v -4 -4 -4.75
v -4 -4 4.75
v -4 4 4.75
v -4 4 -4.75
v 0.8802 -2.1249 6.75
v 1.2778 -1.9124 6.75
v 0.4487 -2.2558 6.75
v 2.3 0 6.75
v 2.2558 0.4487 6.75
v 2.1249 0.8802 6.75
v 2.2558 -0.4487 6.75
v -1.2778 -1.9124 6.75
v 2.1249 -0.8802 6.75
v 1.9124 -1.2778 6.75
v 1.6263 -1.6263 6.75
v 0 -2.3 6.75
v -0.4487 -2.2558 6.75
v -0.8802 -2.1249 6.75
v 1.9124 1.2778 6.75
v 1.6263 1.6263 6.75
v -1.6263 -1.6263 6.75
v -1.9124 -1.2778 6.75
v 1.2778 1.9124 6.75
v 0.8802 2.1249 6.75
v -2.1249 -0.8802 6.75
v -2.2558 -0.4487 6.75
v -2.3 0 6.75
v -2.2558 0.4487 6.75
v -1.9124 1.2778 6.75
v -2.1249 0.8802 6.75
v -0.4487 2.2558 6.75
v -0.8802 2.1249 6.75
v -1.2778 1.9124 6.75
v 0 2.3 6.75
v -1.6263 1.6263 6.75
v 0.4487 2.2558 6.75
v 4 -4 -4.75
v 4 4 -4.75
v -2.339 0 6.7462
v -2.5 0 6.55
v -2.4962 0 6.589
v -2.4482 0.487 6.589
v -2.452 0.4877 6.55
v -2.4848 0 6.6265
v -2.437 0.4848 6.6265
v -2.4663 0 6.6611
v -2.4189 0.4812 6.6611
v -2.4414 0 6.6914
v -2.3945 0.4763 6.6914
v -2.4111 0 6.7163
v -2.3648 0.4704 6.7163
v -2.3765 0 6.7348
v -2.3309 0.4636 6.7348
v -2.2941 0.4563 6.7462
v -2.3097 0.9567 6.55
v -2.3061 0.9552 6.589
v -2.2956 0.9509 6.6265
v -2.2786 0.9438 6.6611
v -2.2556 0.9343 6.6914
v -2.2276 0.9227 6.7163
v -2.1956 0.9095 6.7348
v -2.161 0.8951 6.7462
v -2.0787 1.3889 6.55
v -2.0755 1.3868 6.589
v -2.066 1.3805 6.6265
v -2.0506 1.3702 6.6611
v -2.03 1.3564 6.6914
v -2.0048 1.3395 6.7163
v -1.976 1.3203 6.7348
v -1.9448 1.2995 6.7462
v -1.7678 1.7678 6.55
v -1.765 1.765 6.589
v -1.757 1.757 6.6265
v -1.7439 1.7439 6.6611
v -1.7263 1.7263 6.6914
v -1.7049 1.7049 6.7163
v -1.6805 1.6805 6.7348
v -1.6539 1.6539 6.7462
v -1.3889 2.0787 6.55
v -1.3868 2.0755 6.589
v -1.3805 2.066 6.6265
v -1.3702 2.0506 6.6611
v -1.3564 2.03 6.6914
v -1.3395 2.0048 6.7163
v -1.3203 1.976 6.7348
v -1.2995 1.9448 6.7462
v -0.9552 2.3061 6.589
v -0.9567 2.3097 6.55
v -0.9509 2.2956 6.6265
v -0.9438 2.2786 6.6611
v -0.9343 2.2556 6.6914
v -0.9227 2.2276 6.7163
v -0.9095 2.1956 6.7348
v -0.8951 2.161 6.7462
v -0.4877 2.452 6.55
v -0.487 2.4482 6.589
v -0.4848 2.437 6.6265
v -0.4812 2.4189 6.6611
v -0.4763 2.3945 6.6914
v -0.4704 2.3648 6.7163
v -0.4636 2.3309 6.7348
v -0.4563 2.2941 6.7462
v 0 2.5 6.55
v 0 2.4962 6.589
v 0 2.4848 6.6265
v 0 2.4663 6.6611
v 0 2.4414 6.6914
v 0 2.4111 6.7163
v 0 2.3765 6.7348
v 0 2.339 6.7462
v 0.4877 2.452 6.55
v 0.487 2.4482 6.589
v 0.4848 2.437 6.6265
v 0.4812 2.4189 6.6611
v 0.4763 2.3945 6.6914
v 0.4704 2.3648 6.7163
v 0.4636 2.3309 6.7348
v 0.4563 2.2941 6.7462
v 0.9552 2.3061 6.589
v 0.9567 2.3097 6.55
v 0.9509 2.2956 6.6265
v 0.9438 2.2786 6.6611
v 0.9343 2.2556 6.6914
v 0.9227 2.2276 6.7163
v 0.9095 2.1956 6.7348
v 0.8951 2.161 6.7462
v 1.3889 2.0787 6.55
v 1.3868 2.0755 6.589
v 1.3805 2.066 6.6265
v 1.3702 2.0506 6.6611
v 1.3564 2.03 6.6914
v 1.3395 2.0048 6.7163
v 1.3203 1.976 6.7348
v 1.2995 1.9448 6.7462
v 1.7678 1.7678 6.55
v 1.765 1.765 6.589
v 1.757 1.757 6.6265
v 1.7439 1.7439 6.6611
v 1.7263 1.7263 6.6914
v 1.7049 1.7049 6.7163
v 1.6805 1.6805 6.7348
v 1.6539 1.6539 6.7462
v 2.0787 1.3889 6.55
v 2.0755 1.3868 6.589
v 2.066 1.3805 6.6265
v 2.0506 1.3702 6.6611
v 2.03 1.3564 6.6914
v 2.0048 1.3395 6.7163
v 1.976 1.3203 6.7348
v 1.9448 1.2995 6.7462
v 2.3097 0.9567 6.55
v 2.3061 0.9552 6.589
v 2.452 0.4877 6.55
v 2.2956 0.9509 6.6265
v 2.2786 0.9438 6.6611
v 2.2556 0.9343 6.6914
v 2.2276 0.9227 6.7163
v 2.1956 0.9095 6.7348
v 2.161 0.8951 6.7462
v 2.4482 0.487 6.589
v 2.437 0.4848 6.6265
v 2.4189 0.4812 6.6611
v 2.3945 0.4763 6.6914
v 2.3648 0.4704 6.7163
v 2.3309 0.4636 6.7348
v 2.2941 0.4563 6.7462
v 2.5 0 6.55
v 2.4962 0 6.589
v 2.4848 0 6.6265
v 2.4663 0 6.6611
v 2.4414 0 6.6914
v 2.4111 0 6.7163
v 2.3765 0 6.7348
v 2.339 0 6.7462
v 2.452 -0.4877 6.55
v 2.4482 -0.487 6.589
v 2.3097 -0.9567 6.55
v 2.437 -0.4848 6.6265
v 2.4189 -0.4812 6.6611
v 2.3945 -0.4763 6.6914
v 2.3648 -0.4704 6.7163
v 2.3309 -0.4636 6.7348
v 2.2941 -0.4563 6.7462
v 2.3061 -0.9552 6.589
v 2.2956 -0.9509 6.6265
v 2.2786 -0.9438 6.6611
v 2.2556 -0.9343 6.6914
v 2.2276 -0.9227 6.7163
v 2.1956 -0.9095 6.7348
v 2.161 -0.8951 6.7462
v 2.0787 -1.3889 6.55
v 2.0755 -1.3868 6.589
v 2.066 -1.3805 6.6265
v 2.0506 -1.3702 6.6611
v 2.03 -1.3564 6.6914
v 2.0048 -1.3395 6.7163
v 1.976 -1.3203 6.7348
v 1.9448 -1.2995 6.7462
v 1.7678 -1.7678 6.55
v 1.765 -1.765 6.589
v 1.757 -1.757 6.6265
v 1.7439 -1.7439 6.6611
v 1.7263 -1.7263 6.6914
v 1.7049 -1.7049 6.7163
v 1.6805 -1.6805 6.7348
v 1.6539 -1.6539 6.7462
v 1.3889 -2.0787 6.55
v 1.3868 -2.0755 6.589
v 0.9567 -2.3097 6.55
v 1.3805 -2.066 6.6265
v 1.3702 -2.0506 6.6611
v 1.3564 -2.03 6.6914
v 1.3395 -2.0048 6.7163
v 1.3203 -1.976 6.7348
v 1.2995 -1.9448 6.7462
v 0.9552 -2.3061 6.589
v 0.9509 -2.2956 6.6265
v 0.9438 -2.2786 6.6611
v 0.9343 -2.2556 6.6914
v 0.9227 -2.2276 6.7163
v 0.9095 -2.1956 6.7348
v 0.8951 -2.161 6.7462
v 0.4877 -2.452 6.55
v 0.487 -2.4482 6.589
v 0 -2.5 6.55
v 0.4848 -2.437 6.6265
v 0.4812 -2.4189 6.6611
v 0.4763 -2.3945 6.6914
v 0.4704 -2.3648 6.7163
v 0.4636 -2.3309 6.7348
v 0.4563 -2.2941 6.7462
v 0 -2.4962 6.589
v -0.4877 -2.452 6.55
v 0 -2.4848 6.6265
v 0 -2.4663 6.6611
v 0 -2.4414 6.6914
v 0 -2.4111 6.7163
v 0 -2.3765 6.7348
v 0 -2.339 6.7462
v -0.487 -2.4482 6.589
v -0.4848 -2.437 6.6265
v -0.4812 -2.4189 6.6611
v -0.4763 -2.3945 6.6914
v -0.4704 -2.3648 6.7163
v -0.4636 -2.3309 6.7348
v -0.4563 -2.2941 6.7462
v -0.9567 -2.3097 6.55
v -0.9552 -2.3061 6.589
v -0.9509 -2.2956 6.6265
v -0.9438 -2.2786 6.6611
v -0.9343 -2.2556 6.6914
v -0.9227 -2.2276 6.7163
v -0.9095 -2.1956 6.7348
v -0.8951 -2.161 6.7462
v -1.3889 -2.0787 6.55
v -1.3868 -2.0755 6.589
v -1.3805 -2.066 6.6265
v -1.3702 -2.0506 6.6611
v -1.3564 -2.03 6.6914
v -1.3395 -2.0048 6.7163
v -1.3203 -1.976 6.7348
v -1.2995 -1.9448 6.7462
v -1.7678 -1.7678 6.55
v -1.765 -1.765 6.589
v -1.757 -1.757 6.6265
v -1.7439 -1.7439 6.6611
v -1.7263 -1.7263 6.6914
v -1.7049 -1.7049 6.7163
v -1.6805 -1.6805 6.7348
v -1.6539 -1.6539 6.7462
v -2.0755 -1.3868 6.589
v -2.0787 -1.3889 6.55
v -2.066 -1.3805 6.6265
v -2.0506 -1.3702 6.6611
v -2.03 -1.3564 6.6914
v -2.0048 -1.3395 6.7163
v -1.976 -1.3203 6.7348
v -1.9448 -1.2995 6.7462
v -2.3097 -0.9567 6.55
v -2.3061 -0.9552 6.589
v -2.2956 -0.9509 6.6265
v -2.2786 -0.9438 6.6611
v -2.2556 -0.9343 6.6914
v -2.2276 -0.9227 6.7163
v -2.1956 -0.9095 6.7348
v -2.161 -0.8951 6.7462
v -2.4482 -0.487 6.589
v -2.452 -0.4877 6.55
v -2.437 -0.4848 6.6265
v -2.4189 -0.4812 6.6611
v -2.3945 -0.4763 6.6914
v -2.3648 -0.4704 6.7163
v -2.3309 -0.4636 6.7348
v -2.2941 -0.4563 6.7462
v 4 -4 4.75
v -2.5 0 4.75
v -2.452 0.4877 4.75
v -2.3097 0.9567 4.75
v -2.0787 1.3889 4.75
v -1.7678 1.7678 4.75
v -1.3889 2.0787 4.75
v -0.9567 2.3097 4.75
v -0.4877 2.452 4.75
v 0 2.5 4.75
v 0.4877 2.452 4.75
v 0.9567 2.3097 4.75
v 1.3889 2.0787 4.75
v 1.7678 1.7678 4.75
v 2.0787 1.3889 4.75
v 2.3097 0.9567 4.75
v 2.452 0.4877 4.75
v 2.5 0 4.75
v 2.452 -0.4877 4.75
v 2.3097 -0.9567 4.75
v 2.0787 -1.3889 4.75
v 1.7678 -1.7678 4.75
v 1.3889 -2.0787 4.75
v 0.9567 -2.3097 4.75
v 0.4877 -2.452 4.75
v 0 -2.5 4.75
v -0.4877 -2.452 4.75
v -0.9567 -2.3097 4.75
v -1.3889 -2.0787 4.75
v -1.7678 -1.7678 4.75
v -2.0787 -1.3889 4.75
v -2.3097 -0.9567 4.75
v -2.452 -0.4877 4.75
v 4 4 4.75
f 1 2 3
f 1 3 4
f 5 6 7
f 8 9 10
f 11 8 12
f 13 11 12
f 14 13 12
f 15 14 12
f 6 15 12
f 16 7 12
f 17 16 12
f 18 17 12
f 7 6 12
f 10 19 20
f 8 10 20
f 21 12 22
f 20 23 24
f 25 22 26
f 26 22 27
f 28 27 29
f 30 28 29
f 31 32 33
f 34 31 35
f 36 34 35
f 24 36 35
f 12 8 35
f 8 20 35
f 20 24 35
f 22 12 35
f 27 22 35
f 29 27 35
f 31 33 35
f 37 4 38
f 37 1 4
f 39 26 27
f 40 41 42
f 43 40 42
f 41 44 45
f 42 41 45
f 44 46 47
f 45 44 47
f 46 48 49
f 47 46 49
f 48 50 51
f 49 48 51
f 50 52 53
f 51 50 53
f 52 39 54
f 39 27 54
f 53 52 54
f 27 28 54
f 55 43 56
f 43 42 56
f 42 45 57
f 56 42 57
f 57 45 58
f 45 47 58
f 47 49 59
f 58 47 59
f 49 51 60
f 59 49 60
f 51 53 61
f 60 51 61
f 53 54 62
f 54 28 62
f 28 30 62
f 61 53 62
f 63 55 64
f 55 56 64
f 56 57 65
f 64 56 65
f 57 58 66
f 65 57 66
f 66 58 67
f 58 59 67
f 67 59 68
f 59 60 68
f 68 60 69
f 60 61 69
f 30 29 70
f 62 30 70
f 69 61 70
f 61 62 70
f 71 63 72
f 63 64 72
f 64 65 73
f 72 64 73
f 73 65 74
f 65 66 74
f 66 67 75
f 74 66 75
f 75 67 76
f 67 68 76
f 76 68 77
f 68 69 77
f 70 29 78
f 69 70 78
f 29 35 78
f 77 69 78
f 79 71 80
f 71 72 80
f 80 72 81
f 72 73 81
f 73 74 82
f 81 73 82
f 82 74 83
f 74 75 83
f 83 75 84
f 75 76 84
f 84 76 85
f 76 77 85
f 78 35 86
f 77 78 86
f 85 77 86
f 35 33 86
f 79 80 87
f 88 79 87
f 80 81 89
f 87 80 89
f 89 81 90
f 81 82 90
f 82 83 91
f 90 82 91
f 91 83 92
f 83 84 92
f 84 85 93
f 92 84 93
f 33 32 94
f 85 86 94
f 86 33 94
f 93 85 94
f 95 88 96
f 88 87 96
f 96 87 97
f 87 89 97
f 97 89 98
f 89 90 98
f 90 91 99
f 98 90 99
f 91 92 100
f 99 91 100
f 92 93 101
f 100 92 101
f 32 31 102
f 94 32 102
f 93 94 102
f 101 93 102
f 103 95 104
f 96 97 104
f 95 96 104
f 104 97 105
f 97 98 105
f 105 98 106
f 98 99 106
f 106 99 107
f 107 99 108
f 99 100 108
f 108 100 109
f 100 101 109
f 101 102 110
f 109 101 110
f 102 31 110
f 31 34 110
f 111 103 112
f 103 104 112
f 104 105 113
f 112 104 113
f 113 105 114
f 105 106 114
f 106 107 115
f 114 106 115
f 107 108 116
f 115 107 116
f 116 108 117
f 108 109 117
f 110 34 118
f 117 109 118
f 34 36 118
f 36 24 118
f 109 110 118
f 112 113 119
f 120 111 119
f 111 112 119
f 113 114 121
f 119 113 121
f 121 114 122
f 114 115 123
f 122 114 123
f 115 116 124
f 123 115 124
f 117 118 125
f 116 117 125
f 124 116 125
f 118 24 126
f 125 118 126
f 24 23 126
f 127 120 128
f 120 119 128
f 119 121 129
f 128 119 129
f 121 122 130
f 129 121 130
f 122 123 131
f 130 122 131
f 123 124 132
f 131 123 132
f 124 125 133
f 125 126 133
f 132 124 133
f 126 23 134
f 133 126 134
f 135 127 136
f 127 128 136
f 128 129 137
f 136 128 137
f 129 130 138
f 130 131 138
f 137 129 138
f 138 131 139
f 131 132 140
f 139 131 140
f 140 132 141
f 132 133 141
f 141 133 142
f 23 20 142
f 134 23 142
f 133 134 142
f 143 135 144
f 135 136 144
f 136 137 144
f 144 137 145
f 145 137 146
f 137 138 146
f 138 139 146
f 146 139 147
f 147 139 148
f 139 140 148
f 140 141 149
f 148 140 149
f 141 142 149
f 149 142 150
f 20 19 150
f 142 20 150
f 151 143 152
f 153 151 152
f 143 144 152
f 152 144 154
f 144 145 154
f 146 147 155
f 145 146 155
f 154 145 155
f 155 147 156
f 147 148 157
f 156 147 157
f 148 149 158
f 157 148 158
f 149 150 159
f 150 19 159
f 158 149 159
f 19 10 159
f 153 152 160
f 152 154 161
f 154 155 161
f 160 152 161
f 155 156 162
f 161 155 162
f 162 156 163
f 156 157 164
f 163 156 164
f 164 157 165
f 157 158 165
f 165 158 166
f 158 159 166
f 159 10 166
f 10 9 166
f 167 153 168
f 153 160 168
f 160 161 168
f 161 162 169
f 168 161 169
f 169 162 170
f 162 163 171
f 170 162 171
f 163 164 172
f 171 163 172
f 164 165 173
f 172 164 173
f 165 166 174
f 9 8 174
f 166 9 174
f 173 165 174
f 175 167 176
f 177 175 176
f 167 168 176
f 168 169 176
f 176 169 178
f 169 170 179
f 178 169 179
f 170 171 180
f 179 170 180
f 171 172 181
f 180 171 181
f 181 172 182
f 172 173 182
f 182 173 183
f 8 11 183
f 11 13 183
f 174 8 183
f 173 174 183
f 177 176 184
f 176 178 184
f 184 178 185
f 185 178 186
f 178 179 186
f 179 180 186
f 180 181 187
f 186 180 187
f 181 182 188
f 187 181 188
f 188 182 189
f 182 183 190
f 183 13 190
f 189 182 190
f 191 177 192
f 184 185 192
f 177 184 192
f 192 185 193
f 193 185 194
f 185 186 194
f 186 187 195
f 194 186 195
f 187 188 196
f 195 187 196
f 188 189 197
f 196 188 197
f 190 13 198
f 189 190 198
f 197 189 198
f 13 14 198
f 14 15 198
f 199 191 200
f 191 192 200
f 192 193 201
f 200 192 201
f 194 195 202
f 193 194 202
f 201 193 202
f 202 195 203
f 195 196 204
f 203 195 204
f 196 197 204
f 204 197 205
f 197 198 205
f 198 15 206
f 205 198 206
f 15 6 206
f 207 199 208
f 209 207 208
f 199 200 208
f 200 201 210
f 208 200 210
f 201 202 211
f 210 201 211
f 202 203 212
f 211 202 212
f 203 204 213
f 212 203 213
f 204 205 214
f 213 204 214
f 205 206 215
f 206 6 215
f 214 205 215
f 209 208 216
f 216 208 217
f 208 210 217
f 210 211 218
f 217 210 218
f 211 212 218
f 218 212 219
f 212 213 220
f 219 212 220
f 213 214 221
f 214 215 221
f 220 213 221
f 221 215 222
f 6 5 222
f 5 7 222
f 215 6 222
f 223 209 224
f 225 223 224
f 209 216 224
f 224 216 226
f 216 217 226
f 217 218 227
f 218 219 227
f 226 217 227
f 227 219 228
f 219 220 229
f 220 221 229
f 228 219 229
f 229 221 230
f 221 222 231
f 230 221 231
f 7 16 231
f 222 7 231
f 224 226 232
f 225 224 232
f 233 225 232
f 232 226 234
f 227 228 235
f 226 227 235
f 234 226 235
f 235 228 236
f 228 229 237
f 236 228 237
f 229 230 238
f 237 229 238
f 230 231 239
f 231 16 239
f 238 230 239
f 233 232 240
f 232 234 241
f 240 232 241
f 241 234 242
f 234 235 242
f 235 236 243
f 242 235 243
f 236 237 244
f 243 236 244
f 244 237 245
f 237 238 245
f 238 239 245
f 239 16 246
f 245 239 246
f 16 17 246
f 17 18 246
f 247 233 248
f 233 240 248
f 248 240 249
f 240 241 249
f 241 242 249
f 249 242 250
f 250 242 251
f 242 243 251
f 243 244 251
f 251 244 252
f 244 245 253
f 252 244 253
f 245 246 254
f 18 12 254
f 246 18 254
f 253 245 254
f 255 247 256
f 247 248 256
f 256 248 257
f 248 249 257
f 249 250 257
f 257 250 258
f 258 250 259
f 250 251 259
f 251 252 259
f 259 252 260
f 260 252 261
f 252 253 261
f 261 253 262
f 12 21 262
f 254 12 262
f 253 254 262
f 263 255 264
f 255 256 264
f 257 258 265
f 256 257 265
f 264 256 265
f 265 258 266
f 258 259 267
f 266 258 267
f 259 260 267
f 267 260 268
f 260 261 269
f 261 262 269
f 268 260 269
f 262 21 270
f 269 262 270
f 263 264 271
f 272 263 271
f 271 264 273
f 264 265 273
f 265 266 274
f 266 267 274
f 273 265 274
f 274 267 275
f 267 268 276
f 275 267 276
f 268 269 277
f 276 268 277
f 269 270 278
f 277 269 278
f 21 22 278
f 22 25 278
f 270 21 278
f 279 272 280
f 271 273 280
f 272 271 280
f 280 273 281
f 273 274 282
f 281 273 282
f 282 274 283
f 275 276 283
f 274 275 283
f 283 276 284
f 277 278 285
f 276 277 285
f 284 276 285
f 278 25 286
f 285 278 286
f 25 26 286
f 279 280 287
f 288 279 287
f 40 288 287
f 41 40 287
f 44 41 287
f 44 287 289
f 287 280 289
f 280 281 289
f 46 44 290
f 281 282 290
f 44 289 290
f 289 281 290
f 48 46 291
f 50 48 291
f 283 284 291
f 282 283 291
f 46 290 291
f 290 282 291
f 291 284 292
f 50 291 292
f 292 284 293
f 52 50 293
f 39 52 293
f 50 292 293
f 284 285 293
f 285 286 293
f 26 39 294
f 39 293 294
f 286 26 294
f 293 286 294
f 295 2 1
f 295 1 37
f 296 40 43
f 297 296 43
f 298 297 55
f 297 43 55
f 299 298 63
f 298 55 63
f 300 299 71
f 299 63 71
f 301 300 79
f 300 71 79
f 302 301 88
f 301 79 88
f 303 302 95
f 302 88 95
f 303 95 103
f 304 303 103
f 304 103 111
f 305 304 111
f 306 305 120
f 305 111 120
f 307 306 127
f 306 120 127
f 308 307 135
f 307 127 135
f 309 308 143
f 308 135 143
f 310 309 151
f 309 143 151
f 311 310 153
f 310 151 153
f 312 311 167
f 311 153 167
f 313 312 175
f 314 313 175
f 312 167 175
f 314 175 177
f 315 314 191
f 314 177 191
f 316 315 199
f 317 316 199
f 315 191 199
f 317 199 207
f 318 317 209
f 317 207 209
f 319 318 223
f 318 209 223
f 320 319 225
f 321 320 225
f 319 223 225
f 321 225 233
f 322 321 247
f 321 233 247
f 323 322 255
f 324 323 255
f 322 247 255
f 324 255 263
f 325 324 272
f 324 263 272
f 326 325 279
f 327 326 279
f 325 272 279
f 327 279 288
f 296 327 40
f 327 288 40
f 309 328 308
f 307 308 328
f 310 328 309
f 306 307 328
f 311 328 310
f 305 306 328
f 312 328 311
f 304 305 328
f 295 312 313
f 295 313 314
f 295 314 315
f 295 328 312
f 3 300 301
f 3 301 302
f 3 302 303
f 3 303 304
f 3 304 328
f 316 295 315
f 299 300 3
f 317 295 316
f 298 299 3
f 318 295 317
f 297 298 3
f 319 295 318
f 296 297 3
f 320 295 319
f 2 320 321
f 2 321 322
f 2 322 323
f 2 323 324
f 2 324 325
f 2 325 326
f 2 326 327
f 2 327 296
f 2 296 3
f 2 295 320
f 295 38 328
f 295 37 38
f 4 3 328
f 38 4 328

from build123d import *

# Parameters (mm, degrees)
F0_W     = 2.5
F0_H     = 2
F2_DEPTH = 4
F3_R     = 0.2


with BuildPart() as f1:
    # F0 (on Front) → F1 (revolve)
    with BuildSketch(Plane.XZ):
        with Locations((-1.25, 5.75)):
            Rectangle(F0_W, F0_H)
    revolve(axis=Axis((0, 0, 1), (0, 0, -1)))

    # F0 (on Front) → F2 (join, symmetric)
    with BuildSketch(Plane.XZ):
        Polygon((4, -4.75), (4, 4.75), (2.5, 4.75), (0, 4.75), (0, -4.75), align=None)
        Polygon((0, -4.75), (0, 4.75), (-2.5, 4.75), (-4, 4.75), (-4, -4.75), align=None)
    extrude(amount=F2_DEPTH, both=True)

    # F3
    f3_edges = [f1.edges().sort_by_distance(p)[0] for p in [
        (2.5, 0, 6.75),
    ]]
    fillet(f3_edges, radius=F3_R)


solid = f1.part
